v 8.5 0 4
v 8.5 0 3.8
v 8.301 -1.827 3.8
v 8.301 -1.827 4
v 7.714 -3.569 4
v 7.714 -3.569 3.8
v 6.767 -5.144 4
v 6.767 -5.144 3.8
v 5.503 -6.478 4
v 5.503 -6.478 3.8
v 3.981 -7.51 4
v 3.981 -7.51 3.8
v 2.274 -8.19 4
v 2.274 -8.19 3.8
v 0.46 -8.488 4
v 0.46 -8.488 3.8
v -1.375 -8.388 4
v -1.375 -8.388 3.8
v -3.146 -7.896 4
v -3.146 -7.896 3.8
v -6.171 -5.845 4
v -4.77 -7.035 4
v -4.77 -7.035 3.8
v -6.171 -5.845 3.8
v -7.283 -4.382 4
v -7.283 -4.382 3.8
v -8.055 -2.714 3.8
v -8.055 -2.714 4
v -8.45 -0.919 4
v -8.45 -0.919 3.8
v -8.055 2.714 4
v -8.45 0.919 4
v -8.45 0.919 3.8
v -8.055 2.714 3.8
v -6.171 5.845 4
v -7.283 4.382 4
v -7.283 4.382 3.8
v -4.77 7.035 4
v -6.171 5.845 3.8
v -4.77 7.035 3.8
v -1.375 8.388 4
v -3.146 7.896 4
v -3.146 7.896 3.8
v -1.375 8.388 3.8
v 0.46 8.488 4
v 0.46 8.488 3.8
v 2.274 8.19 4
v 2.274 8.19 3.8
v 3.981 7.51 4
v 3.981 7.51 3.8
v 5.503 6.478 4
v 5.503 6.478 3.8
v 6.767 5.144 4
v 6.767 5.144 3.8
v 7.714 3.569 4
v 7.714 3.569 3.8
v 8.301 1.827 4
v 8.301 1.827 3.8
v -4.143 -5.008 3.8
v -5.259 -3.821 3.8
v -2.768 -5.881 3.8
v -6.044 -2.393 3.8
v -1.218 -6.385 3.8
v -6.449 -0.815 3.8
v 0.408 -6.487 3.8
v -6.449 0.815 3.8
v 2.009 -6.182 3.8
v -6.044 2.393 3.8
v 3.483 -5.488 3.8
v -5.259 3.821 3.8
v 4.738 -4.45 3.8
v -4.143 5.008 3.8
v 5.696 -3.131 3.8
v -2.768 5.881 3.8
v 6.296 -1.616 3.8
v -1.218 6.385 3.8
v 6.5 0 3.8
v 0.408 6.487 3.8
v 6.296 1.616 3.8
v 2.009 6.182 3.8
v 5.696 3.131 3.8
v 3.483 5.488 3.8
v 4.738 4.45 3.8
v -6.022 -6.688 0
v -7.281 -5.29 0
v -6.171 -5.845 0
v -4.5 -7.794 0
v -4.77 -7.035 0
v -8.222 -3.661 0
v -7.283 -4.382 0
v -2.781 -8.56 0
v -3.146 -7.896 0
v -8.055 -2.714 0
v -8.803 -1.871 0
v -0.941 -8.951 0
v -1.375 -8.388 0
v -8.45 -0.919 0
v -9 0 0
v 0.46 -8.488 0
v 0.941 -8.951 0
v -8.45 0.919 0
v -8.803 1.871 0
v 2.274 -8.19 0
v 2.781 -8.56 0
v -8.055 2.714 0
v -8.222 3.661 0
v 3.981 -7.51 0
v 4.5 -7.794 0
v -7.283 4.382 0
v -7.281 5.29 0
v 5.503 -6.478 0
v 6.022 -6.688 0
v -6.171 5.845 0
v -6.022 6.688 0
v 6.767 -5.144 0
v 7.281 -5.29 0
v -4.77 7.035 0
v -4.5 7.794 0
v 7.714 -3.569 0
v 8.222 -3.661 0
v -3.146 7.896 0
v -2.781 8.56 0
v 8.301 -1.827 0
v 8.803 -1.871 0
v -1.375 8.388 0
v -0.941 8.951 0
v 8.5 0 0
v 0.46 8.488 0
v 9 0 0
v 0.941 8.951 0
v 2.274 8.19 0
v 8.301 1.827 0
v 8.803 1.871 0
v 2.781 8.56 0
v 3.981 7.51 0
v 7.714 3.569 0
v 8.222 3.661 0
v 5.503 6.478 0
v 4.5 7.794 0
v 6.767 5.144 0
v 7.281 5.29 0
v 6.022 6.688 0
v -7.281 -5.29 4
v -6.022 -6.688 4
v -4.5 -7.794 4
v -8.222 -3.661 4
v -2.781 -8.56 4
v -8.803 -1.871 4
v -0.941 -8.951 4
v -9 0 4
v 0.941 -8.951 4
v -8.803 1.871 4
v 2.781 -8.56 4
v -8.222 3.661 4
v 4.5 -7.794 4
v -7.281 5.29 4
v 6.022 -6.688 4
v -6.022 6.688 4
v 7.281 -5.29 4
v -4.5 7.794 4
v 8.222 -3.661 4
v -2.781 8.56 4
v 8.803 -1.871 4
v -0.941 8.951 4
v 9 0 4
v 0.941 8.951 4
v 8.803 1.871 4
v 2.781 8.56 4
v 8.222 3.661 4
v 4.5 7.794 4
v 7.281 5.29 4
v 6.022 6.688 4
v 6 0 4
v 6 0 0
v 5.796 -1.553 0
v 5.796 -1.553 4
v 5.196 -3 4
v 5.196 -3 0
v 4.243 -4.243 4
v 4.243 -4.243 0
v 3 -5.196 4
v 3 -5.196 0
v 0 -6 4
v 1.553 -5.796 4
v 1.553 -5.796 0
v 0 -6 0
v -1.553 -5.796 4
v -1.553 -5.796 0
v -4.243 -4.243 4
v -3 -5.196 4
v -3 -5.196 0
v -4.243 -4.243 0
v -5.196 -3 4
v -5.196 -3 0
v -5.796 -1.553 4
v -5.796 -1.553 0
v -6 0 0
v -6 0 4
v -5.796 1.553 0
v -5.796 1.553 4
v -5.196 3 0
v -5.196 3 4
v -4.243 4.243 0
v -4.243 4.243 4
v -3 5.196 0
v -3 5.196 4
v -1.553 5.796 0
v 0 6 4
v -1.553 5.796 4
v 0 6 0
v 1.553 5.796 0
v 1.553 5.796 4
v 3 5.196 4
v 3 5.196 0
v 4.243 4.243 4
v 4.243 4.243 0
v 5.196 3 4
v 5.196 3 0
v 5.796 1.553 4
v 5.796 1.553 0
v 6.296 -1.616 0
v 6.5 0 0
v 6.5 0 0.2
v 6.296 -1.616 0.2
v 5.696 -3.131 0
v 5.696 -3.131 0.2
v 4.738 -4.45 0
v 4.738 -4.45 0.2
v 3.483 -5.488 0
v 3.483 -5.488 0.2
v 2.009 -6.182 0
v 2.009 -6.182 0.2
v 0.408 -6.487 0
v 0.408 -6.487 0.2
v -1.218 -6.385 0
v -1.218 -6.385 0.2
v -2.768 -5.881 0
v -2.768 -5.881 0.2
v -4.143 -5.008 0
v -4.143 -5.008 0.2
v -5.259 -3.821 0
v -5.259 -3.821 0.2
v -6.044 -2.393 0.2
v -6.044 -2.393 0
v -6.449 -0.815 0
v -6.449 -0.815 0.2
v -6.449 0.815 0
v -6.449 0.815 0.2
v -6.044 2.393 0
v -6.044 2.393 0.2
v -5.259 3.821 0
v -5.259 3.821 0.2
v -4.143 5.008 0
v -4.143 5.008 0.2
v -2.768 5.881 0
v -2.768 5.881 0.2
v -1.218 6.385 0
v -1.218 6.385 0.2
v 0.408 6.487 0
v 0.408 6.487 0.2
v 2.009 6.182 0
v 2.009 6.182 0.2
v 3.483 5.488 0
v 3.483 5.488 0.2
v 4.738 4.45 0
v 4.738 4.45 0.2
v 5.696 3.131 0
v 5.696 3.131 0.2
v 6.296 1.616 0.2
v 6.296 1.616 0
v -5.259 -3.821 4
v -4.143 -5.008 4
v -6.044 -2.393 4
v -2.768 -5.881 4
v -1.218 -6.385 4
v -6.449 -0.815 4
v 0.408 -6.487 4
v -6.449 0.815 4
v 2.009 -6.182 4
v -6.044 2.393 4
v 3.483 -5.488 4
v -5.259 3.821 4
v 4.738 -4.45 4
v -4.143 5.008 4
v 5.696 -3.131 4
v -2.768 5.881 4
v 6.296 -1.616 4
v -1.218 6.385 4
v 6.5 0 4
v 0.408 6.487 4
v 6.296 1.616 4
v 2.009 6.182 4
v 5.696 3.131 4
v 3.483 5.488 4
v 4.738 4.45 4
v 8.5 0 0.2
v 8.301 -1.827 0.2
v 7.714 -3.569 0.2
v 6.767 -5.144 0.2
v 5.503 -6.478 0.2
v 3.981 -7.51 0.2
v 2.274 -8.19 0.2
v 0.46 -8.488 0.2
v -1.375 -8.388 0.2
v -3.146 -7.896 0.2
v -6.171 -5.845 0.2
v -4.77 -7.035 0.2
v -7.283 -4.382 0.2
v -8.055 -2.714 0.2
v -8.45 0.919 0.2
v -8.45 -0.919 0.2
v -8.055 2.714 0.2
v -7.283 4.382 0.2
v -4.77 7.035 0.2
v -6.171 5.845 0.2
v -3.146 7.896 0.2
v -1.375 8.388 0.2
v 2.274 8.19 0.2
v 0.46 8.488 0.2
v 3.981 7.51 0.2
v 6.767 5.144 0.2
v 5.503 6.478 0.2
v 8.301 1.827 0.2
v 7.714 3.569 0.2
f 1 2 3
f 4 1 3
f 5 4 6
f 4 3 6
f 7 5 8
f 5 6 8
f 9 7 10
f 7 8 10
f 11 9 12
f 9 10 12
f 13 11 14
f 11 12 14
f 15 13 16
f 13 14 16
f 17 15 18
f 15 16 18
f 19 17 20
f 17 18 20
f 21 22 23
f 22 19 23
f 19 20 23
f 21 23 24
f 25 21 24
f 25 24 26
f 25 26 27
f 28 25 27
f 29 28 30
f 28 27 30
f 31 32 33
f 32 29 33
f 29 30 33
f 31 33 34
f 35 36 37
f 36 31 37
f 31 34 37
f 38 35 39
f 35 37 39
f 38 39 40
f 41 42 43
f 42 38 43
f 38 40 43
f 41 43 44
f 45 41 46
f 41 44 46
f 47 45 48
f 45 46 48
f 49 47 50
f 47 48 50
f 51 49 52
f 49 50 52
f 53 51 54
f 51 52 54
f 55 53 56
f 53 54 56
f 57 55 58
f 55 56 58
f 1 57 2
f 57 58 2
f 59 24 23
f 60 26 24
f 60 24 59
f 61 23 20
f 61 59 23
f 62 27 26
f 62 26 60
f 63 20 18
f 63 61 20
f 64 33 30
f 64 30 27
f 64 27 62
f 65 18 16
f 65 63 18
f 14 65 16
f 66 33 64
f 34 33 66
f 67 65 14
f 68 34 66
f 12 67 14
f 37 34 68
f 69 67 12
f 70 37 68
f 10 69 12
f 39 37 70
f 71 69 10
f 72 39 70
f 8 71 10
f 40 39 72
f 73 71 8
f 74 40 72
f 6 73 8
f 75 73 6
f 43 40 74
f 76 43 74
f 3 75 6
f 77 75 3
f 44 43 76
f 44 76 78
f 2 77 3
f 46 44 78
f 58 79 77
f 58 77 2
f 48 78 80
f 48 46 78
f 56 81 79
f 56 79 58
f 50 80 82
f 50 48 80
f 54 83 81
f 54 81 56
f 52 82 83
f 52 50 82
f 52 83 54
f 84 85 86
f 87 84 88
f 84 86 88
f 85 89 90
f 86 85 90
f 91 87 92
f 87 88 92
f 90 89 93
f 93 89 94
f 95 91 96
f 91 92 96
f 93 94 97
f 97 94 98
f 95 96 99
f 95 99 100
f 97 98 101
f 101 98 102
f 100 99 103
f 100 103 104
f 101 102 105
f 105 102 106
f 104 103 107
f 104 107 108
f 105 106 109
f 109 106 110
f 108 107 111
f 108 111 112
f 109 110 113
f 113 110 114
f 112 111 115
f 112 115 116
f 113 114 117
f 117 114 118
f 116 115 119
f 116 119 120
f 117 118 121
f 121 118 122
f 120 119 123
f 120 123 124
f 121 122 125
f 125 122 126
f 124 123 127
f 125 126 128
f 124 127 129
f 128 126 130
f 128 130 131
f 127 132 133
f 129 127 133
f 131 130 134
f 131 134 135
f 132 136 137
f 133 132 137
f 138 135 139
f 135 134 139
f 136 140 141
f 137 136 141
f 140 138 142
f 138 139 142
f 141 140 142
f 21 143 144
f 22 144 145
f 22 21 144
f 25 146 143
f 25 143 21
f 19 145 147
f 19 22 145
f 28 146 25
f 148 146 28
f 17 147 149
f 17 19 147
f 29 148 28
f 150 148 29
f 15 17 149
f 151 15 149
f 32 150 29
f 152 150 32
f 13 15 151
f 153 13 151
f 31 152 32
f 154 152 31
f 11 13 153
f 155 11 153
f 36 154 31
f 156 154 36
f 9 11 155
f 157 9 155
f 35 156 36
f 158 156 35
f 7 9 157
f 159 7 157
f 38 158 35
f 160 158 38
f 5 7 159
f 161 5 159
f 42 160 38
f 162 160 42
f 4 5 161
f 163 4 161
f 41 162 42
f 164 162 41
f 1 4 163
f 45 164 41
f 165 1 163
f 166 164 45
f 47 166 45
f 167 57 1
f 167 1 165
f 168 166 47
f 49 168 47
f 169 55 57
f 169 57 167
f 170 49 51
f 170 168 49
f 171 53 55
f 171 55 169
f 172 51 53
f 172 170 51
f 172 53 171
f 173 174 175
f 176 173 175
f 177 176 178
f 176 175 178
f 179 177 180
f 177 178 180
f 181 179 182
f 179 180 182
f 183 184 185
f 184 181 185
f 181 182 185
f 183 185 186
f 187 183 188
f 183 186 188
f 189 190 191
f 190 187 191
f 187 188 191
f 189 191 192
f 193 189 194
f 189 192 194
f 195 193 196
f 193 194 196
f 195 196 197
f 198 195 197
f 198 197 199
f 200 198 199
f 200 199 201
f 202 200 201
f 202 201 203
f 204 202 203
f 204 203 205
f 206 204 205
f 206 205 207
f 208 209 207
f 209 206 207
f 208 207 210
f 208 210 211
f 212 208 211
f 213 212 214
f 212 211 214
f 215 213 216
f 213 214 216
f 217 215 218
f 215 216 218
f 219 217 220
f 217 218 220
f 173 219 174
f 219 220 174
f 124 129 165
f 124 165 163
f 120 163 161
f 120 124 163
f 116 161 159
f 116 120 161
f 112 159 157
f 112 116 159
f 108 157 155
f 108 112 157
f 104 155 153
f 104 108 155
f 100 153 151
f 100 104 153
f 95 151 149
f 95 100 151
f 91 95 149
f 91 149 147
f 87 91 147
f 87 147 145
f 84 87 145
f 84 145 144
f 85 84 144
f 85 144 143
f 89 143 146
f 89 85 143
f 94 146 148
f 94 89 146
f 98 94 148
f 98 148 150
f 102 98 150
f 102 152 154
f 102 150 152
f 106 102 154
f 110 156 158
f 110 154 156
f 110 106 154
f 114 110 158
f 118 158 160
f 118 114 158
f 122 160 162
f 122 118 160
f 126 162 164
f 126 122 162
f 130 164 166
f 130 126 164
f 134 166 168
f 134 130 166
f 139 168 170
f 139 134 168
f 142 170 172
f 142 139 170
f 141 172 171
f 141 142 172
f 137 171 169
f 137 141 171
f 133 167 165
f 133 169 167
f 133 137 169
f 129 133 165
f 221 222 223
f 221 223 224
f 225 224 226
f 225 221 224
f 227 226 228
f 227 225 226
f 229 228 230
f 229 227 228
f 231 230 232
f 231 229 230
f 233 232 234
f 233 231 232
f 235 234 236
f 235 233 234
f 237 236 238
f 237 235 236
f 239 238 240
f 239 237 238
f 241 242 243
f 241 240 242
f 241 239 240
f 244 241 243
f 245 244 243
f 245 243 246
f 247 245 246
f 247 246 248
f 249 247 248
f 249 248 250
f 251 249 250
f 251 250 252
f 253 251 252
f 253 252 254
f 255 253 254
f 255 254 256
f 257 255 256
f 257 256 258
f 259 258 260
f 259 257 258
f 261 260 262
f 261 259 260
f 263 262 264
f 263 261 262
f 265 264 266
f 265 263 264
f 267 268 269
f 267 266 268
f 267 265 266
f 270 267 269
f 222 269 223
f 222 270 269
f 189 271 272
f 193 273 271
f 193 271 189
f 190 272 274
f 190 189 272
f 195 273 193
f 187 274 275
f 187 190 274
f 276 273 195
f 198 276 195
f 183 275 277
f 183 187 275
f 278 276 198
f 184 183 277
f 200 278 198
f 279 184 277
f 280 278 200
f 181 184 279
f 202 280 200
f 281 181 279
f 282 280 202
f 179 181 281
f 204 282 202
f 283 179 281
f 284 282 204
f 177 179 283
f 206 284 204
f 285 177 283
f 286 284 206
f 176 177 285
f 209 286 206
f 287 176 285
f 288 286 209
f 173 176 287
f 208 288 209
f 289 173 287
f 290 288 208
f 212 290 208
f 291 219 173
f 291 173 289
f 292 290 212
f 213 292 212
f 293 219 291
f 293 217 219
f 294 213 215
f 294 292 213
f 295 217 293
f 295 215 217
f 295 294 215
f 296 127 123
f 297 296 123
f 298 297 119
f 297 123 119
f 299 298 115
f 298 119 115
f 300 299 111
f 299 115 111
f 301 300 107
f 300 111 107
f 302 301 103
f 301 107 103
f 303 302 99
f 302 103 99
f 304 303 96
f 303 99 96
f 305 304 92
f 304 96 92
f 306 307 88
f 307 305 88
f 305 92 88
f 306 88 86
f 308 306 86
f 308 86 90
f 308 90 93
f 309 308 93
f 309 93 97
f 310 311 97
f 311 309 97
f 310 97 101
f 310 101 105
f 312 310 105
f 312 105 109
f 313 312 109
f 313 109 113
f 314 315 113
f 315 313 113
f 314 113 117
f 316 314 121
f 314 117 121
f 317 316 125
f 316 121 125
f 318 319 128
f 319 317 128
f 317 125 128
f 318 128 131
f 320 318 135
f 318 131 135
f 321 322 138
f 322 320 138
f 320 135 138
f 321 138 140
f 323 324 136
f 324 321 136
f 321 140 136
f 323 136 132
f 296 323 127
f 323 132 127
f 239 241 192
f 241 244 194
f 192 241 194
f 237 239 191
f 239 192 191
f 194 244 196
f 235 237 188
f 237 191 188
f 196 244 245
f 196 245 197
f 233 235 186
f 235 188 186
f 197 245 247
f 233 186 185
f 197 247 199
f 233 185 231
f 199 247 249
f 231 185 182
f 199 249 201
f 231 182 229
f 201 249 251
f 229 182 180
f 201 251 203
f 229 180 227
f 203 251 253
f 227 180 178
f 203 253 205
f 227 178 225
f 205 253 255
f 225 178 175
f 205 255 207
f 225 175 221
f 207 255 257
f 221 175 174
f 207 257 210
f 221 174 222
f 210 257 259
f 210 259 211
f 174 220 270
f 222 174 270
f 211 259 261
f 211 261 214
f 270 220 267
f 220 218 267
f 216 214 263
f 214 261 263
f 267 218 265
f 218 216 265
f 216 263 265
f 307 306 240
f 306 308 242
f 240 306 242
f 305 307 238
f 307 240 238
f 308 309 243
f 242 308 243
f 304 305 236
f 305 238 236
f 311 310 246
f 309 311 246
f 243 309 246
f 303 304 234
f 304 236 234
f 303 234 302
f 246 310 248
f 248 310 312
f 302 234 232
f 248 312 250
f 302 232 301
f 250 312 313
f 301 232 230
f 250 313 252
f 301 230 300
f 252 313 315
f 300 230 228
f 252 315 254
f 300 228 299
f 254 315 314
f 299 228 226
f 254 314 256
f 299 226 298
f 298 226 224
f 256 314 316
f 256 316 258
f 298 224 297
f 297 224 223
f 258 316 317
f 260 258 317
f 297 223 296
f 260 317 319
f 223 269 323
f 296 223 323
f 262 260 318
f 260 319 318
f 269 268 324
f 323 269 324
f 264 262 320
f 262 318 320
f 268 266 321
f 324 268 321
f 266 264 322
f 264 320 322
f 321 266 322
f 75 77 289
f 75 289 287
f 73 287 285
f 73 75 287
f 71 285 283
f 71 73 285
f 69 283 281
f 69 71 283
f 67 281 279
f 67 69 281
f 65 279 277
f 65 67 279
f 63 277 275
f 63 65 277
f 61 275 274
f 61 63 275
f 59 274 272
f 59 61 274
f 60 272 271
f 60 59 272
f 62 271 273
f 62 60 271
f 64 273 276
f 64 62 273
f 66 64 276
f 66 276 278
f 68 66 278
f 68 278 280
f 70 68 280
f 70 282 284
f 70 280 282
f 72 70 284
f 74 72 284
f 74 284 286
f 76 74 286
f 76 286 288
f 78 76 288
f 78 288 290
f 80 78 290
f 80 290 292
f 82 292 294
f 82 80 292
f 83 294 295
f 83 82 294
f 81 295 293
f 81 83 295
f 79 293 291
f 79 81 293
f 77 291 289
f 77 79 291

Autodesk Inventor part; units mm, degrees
ref_plane "YZ Plane" through (0, 0, 0) normal (1, 0, 0) x (0, 1, 0)
ref_plane "XZ Plane" through (0, 0, 0) normal (0, 1, 0) x (-1, 0, 0)
sketch "Sketch1" plane through (0, 0, 0) normal (0, 0, 1) x (1, 0, 0)
  circle A0 centre (0, 0) radius 9
  circle A1 centre (0, 0) radius 6
  circle A2 centre (0, 0) radius 6.5
  circle A3 centre (0, 0) radius 8.5
  dimension "d0" = 18
  dimension "d1" = 12
  dimension "d2" = 0.5
  dimension "d3" = 0.5
extrude "Extrusion1" add sketch "Sketch1" along normal blind 4
ref_plane "Work Plane1" through (0, 0, 0.2) normal (0, 0, 1) x (1, 0, 0)
sketch "Sketch2" plane through (0, 0, 0.2) normal (0, 0, 1) x (1, 0, 0)
  circle A0 centre (0, 0) radius 8.5 projected
  circle A1 centre (0, 0) radius 9 projected
  circle A2 centre (0, 0) radius 6 projected
  circle A3 centre (0, 0) radius 6.5 projected
extrude "Extrusion2" add sketch "Sketch2" along normal blind 3.6 contours A0
properties part number "18x12x4 bearing"
